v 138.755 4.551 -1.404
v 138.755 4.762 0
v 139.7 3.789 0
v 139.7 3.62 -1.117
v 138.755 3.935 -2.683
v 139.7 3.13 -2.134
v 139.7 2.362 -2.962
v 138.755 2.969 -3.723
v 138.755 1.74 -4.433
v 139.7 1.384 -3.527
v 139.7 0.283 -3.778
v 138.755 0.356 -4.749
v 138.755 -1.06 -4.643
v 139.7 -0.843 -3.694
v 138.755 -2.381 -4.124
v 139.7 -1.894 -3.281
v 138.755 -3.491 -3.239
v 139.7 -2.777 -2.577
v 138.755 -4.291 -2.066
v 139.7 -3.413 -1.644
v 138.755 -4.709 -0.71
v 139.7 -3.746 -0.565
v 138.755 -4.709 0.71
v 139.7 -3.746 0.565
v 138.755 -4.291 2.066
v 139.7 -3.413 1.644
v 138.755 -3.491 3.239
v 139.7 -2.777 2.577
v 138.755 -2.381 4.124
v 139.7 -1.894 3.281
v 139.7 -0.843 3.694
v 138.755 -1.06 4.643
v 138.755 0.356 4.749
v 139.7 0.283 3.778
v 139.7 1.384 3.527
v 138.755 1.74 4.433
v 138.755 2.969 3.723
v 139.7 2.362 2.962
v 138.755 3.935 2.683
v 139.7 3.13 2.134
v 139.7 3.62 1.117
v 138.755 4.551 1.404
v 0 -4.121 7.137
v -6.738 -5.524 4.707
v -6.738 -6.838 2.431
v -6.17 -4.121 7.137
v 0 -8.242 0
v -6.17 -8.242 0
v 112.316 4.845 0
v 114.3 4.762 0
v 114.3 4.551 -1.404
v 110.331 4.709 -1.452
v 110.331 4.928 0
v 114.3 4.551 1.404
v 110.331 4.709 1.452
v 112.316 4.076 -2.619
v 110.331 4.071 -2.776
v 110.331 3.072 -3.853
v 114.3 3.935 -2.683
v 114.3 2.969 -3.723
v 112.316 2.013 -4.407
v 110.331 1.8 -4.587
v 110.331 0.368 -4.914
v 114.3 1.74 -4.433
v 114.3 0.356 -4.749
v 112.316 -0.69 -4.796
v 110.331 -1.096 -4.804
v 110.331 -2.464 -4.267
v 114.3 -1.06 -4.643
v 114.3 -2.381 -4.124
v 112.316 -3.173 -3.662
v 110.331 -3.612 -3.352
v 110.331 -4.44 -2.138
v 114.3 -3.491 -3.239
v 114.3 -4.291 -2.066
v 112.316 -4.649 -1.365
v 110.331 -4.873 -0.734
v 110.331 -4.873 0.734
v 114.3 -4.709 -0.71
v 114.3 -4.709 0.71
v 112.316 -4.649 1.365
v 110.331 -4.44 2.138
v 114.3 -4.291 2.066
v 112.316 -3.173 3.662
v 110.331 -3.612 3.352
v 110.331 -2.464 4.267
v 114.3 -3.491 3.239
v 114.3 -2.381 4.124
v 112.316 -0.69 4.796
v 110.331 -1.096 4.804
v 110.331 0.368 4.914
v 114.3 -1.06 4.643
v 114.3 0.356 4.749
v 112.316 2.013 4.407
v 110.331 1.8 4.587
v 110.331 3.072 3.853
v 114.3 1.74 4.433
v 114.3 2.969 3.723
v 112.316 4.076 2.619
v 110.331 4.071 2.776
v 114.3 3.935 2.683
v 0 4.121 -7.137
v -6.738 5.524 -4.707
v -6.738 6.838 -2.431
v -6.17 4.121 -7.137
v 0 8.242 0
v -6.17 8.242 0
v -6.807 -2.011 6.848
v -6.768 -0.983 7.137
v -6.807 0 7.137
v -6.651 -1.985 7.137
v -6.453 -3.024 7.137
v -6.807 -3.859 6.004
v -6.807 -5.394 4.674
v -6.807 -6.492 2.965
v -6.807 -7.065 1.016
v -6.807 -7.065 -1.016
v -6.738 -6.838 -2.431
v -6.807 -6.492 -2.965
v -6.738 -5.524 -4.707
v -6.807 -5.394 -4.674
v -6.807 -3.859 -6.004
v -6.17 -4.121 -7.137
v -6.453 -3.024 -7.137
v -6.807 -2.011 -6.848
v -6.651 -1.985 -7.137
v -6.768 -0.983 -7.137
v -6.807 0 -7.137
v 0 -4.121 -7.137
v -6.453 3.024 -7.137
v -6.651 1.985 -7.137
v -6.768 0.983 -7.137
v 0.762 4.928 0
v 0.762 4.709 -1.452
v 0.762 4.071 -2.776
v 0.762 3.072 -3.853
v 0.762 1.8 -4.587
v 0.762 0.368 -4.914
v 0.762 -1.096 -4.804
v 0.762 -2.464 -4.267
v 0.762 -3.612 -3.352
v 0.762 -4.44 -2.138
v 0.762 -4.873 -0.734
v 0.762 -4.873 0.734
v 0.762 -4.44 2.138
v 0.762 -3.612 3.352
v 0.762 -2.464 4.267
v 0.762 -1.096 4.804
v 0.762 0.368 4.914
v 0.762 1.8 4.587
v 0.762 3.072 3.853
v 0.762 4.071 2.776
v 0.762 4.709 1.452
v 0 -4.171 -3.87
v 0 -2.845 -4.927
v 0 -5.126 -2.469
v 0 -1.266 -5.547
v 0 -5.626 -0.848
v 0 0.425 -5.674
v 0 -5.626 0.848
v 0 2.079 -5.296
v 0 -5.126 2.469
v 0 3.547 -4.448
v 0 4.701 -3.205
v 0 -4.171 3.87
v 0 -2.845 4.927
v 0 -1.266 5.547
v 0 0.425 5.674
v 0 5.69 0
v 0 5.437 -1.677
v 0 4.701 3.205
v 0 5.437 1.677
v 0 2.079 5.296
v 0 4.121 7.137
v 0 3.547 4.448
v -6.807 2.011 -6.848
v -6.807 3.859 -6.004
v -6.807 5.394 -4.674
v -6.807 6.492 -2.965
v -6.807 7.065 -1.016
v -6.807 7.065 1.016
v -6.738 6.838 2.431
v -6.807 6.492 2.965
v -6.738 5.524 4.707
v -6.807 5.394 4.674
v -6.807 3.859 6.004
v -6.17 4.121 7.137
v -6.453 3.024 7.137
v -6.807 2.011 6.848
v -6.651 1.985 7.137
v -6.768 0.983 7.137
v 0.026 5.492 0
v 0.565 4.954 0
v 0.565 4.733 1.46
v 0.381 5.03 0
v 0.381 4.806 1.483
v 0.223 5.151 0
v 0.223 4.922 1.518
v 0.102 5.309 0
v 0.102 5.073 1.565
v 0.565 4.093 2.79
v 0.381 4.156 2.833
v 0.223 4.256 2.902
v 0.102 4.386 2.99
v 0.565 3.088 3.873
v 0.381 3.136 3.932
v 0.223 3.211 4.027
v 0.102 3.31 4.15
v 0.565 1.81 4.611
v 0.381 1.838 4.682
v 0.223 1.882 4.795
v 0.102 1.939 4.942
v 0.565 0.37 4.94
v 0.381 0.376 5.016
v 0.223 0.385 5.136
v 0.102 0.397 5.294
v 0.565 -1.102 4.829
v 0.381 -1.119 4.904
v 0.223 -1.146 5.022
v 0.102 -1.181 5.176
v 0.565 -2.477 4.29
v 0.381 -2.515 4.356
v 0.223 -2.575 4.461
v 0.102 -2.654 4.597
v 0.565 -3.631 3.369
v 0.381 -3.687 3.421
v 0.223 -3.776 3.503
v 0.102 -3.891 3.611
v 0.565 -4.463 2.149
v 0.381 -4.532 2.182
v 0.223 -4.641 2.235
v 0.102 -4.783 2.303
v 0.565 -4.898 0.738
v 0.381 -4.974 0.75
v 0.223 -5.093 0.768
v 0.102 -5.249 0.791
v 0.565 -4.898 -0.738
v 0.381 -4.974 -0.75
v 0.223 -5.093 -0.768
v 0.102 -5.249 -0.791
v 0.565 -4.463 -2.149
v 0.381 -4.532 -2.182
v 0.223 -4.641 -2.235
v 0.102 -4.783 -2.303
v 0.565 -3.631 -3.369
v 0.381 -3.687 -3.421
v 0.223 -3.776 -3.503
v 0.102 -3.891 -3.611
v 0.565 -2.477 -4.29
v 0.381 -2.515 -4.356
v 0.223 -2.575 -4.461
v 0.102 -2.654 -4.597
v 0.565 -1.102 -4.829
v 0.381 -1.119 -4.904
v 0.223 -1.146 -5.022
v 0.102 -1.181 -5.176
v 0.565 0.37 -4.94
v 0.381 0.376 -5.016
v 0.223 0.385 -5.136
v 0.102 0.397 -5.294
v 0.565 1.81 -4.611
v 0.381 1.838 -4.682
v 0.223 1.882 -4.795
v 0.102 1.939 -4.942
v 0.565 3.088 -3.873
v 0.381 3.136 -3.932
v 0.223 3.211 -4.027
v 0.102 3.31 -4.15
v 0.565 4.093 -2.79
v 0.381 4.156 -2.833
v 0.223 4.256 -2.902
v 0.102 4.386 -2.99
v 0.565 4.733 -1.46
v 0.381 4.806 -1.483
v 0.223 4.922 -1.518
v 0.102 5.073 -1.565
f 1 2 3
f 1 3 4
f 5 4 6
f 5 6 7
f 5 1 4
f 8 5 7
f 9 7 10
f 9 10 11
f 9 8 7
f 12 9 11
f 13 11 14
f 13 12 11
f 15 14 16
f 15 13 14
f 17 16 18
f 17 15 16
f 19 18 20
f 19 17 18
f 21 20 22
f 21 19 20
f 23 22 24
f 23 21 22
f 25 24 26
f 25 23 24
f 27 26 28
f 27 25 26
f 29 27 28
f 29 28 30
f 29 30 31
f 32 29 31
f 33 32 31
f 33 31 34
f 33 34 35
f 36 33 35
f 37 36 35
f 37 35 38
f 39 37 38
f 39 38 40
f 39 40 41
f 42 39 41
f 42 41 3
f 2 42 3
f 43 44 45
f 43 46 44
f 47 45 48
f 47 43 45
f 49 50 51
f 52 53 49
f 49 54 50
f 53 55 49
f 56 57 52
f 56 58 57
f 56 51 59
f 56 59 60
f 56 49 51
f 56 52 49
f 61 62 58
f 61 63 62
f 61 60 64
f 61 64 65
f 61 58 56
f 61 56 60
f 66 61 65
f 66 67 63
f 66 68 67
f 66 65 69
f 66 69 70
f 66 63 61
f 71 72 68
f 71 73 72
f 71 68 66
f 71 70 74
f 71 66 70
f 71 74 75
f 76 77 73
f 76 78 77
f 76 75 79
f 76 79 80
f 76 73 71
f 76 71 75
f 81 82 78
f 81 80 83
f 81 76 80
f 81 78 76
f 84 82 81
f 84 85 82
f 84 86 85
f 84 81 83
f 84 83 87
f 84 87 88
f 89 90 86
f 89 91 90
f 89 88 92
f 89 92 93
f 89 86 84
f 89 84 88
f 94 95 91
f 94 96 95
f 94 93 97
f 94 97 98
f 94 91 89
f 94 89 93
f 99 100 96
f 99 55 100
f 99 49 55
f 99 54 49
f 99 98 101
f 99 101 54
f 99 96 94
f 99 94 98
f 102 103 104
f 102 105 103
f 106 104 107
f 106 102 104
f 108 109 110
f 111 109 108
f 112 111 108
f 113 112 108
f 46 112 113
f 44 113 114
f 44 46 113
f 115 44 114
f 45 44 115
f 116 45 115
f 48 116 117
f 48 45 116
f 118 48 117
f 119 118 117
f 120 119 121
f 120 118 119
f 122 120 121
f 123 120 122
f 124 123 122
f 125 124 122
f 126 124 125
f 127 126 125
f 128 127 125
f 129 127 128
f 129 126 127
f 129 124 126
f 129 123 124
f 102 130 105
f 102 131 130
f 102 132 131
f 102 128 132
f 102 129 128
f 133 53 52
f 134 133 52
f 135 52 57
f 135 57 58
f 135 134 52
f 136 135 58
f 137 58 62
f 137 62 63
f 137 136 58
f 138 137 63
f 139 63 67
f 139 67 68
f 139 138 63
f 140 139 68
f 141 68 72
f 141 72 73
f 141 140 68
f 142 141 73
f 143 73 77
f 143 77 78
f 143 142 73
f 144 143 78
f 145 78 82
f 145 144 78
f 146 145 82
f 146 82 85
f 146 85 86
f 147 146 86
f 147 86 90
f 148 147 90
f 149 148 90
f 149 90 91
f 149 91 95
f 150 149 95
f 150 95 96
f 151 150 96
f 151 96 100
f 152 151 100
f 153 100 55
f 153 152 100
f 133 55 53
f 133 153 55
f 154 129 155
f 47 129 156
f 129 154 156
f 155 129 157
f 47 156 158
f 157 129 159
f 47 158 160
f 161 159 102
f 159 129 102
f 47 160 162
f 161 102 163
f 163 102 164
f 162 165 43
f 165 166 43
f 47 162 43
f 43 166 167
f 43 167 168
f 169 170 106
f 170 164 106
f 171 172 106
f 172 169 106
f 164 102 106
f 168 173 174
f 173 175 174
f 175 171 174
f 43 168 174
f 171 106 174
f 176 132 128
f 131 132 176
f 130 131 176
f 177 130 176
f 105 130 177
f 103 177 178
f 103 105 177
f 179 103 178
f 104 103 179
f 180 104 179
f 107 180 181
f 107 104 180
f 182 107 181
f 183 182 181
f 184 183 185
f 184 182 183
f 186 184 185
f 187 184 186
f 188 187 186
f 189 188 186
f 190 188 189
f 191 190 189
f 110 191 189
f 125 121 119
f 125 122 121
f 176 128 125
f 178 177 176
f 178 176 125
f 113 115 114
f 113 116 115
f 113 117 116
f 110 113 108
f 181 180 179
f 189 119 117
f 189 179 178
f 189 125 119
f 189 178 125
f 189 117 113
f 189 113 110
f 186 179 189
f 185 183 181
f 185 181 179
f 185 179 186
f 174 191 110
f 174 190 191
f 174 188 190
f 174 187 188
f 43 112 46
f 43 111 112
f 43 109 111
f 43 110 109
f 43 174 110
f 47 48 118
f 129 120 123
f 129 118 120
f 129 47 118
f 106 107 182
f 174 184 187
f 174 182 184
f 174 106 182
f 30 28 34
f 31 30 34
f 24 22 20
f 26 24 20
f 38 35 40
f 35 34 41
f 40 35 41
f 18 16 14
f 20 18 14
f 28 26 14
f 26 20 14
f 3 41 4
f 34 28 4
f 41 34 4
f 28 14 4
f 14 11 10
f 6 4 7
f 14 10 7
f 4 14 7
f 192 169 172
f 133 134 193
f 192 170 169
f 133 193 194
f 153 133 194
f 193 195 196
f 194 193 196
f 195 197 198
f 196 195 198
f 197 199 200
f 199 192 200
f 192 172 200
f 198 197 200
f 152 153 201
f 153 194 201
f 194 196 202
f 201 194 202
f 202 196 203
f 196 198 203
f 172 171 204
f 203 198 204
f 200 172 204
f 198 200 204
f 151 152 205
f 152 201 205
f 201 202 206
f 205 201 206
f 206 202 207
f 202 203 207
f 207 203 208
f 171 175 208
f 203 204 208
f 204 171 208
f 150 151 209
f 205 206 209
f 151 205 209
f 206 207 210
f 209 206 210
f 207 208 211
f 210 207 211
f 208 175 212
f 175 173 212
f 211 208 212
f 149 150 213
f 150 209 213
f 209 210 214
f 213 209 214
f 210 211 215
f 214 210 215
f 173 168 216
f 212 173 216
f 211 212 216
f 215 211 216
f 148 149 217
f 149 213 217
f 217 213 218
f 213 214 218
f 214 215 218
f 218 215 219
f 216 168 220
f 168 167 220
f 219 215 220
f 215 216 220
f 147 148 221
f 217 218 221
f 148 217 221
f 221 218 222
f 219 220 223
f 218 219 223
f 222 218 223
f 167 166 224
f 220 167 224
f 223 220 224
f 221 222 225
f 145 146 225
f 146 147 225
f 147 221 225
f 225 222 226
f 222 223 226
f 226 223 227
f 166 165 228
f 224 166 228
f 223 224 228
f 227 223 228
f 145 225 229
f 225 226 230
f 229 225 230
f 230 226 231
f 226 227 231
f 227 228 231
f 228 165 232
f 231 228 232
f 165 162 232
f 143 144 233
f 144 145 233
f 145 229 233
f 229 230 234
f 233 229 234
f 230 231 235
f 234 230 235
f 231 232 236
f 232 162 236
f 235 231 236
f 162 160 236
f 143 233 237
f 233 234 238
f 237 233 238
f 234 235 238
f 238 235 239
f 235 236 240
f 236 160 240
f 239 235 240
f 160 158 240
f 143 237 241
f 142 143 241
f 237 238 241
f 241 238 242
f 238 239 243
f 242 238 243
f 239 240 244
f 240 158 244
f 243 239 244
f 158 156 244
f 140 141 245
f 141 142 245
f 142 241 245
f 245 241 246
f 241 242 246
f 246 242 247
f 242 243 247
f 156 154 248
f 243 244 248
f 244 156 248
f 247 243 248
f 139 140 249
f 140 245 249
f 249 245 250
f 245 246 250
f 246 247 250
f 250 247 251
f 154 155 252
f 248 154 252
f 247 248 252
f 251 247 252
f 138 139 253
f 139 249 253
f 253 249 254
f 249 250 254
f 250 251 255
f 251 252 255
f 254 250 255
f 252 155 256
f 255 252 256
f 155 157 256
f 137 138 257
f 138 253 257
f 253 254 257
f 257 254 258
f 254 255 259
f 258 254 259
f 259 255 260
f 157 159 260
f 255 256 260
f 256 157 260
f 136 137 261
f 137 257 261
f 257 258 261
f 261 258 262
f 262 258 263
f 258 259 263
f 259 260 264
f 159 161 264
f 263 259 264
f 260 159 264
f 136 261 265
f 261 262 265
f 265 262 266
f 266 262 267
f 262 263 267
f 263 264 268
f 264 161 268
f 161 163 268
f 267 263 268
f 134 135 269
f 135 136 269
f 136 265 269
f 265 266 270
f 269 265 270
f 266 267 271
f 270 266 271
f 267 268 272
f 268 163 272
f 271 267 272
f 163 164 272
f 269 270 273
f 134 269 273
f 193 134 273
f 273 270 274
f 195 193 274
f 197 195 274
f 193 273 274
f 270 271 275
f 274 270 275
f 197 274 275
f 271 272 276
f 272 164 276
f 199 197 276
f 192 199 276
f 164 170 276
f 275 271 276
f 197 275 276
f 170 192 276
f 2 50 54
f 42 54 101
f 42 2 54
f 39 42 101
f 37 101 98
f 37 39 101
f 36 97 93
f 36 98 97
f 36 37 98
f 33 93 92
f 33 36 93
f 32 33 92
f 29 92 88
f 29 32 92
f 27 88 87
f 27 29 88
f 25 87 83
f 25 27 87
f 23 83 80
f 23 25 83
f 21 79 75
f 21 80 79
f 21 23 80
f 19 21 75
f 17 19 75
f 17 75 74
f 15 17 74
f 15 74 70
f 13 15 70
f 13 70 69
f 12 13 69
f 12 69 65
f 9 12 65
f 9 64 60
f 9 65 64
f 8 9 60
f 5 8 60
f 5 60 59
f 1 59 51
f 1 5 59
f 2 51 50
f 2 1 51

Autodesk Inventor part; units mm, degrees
ref_plane "YZ Plane" through (0, 0, 0) normal (1, 0, 0) x (0, 1, 0)
ref_plane "XZ Plane" through (0, 0, 0) normal (0, 1, 0) x (-1, 0, 0)
sketch "Sketch1" plane through (0, 0, 0) normal (0, 0, 1) x (1, 0, 0)
  line L0 (0, 7.1374) -> (0, 4.9276)
  line L1 (114.3, 4.7625) -> (139.7, 4.7625)
  line L2 (139.7, 4.7625) -> (139.7, 0)
  line L3 (139.7, 0) -> (-0.0001, 0)
  line L4 (-27.9401, 0) -> (167.64, 0) projected
  line L5 (-0.0001, 0) -> (-0.0001, 7.1374)
  line L6 (-0.0001, 7.1374) -> (0, 7.1374)
  line L7 (114.3, 4.7625) -> (110.3312, 4.9276)
  line L8 (110.3312, 4.9276) -> (0, 4.9276)
  line L9 (0, -1.4275) -> (0, 8.5649) projected
  dimension "d0" = 139.7
  dimension "d1" = 25.4
  dimension "d2" = 9.525
  dimension "d9" = 0.0001
  dimension "d10" = 14.2748
  dimension "d13" = 3.9689
  dimension "d14" = 9.8552
revolve "Body" add sketch "Sketch1" angle 360 about axis through (139.7, 0, 0) along (-1, 0, 0)
sketch "Sketch2" plane through (-0.0001, 0, 0) normal (-1, 0, 0) x (0, 0, 1)
  line L0 (0, 8.2416) -> (7.1374, 4.1208)
  line L1 (7.1374, 4.1208) -> (7.1374, -4.1208)
  line L2 (7.1374, -4.1208) -> (0, -8.2416)
  line L3 (0, -8.2416) -> (-7.1374, -4.1208)
  line L4 (-7.1374, -4.1208) -> (-7.1374, 4.1208)
  line L5 (-7.1374, 4.1208) -> (0, 8.2416)
  point P0 (0, 0)
  point P1 (0, 0)
  dimension "d11" = 14.2748
extrude "Head" add sketch "Sketch2" along normal blind 6.8072
sketch "Sketch4" plane through (0, 0, 0) normal (0, 0, 1) x (1, 0, 0)
  line L0 (-6.8073, 7.1374) -> (-6.8073, 8.2416)
  line L1 (-6.8073, 8.2416) -> (-6.1698, 8.2416)
  line L2 (-6.1698, 8.2416) -> (-6.8073, 7.1374)
  line L3 (-8.1687, 0) -> (1.3613, 0) projected
  line L4 (-0.0001, 8.2416) -> (-6.8073, 8.2416) projected
  line L5 (-6.8073, 4.1208) -> (-6.8073, 8.2416) projected
  dimension "d5" = 30
  dimension "d19" = 14.2748
revolve "Chamfer1" cut sketch "Sketch4" angle 360 about axis through (-10, 0, 0) along (1, 0, 0)
thread "Thread" size "3/8-16 UNC" class "2A" standard "ANSI Unified Screw Threads" length 25.4
chamfer "Chamfer2" distance 0.9739 distance2 0.9447 1 edges at (139.7, -4.7625, 0) measured on face at (139.7, -0.9018, 0.7989)
ref_plane "Work Plane1" through (1.525, 0, 0) normal (0, 0, 1) x (1, 0, 0)
fillet "Fillet2" radius 0.762 1 edges at (0, -4.9276, 0)
equation "\"d0\" = NLG"
equation "\"d1\" = GEL"
equation "\"d2\" = GD"
equation "\"d10\" = SD2"
equation "\"d14\" = BDM"
equation "\"d11\" = SW"
equation "\"d3\" = KOH - SD"
equation "\"d5\" = ANG1"
equation "\"d19\" = SW0"
equation "\"d63\" = R"
equation "\"d15\" = GEL"
equation "\"d6\" = -0.5 * SPD + 0.5 * GD"
equation "\"NLG\" = 139.7"
equation "\"GD\" = NND"
equation "\"BDM\" = 9.8552"
equation "\"KOH\" = 6.8072"
equation "\"GEL\" = 25.4"
equation "\"SW\" = 14.2748"
equation "\"SW0\" = SW"
equation "\"SPD\" = GD1"
equation "\"SD2\" = SW"
equation "\"SD\" = 0"
equation "\"ANG1\" = 30deg"
equation "\"GAL\" = 3.96875"
equation "\"GUL\" = 0.238 * GAL"
equation "\"R\" = 0.762"
equation "\"d62\" = -NLG - SD + GUL"
equation "\"GD1\" = 7.5773"
equation "\"THREADDIA\" = 9.525"
equation "\"TOA\" = 30deg"
equation "\"NND\" = 9.525"
equation "\"E0\" = 1.155 * SW"
properties part number "ANSI/ASME B18.2.1 - 3/8-16 UNC - 5.5" material "Steel, Mild"
